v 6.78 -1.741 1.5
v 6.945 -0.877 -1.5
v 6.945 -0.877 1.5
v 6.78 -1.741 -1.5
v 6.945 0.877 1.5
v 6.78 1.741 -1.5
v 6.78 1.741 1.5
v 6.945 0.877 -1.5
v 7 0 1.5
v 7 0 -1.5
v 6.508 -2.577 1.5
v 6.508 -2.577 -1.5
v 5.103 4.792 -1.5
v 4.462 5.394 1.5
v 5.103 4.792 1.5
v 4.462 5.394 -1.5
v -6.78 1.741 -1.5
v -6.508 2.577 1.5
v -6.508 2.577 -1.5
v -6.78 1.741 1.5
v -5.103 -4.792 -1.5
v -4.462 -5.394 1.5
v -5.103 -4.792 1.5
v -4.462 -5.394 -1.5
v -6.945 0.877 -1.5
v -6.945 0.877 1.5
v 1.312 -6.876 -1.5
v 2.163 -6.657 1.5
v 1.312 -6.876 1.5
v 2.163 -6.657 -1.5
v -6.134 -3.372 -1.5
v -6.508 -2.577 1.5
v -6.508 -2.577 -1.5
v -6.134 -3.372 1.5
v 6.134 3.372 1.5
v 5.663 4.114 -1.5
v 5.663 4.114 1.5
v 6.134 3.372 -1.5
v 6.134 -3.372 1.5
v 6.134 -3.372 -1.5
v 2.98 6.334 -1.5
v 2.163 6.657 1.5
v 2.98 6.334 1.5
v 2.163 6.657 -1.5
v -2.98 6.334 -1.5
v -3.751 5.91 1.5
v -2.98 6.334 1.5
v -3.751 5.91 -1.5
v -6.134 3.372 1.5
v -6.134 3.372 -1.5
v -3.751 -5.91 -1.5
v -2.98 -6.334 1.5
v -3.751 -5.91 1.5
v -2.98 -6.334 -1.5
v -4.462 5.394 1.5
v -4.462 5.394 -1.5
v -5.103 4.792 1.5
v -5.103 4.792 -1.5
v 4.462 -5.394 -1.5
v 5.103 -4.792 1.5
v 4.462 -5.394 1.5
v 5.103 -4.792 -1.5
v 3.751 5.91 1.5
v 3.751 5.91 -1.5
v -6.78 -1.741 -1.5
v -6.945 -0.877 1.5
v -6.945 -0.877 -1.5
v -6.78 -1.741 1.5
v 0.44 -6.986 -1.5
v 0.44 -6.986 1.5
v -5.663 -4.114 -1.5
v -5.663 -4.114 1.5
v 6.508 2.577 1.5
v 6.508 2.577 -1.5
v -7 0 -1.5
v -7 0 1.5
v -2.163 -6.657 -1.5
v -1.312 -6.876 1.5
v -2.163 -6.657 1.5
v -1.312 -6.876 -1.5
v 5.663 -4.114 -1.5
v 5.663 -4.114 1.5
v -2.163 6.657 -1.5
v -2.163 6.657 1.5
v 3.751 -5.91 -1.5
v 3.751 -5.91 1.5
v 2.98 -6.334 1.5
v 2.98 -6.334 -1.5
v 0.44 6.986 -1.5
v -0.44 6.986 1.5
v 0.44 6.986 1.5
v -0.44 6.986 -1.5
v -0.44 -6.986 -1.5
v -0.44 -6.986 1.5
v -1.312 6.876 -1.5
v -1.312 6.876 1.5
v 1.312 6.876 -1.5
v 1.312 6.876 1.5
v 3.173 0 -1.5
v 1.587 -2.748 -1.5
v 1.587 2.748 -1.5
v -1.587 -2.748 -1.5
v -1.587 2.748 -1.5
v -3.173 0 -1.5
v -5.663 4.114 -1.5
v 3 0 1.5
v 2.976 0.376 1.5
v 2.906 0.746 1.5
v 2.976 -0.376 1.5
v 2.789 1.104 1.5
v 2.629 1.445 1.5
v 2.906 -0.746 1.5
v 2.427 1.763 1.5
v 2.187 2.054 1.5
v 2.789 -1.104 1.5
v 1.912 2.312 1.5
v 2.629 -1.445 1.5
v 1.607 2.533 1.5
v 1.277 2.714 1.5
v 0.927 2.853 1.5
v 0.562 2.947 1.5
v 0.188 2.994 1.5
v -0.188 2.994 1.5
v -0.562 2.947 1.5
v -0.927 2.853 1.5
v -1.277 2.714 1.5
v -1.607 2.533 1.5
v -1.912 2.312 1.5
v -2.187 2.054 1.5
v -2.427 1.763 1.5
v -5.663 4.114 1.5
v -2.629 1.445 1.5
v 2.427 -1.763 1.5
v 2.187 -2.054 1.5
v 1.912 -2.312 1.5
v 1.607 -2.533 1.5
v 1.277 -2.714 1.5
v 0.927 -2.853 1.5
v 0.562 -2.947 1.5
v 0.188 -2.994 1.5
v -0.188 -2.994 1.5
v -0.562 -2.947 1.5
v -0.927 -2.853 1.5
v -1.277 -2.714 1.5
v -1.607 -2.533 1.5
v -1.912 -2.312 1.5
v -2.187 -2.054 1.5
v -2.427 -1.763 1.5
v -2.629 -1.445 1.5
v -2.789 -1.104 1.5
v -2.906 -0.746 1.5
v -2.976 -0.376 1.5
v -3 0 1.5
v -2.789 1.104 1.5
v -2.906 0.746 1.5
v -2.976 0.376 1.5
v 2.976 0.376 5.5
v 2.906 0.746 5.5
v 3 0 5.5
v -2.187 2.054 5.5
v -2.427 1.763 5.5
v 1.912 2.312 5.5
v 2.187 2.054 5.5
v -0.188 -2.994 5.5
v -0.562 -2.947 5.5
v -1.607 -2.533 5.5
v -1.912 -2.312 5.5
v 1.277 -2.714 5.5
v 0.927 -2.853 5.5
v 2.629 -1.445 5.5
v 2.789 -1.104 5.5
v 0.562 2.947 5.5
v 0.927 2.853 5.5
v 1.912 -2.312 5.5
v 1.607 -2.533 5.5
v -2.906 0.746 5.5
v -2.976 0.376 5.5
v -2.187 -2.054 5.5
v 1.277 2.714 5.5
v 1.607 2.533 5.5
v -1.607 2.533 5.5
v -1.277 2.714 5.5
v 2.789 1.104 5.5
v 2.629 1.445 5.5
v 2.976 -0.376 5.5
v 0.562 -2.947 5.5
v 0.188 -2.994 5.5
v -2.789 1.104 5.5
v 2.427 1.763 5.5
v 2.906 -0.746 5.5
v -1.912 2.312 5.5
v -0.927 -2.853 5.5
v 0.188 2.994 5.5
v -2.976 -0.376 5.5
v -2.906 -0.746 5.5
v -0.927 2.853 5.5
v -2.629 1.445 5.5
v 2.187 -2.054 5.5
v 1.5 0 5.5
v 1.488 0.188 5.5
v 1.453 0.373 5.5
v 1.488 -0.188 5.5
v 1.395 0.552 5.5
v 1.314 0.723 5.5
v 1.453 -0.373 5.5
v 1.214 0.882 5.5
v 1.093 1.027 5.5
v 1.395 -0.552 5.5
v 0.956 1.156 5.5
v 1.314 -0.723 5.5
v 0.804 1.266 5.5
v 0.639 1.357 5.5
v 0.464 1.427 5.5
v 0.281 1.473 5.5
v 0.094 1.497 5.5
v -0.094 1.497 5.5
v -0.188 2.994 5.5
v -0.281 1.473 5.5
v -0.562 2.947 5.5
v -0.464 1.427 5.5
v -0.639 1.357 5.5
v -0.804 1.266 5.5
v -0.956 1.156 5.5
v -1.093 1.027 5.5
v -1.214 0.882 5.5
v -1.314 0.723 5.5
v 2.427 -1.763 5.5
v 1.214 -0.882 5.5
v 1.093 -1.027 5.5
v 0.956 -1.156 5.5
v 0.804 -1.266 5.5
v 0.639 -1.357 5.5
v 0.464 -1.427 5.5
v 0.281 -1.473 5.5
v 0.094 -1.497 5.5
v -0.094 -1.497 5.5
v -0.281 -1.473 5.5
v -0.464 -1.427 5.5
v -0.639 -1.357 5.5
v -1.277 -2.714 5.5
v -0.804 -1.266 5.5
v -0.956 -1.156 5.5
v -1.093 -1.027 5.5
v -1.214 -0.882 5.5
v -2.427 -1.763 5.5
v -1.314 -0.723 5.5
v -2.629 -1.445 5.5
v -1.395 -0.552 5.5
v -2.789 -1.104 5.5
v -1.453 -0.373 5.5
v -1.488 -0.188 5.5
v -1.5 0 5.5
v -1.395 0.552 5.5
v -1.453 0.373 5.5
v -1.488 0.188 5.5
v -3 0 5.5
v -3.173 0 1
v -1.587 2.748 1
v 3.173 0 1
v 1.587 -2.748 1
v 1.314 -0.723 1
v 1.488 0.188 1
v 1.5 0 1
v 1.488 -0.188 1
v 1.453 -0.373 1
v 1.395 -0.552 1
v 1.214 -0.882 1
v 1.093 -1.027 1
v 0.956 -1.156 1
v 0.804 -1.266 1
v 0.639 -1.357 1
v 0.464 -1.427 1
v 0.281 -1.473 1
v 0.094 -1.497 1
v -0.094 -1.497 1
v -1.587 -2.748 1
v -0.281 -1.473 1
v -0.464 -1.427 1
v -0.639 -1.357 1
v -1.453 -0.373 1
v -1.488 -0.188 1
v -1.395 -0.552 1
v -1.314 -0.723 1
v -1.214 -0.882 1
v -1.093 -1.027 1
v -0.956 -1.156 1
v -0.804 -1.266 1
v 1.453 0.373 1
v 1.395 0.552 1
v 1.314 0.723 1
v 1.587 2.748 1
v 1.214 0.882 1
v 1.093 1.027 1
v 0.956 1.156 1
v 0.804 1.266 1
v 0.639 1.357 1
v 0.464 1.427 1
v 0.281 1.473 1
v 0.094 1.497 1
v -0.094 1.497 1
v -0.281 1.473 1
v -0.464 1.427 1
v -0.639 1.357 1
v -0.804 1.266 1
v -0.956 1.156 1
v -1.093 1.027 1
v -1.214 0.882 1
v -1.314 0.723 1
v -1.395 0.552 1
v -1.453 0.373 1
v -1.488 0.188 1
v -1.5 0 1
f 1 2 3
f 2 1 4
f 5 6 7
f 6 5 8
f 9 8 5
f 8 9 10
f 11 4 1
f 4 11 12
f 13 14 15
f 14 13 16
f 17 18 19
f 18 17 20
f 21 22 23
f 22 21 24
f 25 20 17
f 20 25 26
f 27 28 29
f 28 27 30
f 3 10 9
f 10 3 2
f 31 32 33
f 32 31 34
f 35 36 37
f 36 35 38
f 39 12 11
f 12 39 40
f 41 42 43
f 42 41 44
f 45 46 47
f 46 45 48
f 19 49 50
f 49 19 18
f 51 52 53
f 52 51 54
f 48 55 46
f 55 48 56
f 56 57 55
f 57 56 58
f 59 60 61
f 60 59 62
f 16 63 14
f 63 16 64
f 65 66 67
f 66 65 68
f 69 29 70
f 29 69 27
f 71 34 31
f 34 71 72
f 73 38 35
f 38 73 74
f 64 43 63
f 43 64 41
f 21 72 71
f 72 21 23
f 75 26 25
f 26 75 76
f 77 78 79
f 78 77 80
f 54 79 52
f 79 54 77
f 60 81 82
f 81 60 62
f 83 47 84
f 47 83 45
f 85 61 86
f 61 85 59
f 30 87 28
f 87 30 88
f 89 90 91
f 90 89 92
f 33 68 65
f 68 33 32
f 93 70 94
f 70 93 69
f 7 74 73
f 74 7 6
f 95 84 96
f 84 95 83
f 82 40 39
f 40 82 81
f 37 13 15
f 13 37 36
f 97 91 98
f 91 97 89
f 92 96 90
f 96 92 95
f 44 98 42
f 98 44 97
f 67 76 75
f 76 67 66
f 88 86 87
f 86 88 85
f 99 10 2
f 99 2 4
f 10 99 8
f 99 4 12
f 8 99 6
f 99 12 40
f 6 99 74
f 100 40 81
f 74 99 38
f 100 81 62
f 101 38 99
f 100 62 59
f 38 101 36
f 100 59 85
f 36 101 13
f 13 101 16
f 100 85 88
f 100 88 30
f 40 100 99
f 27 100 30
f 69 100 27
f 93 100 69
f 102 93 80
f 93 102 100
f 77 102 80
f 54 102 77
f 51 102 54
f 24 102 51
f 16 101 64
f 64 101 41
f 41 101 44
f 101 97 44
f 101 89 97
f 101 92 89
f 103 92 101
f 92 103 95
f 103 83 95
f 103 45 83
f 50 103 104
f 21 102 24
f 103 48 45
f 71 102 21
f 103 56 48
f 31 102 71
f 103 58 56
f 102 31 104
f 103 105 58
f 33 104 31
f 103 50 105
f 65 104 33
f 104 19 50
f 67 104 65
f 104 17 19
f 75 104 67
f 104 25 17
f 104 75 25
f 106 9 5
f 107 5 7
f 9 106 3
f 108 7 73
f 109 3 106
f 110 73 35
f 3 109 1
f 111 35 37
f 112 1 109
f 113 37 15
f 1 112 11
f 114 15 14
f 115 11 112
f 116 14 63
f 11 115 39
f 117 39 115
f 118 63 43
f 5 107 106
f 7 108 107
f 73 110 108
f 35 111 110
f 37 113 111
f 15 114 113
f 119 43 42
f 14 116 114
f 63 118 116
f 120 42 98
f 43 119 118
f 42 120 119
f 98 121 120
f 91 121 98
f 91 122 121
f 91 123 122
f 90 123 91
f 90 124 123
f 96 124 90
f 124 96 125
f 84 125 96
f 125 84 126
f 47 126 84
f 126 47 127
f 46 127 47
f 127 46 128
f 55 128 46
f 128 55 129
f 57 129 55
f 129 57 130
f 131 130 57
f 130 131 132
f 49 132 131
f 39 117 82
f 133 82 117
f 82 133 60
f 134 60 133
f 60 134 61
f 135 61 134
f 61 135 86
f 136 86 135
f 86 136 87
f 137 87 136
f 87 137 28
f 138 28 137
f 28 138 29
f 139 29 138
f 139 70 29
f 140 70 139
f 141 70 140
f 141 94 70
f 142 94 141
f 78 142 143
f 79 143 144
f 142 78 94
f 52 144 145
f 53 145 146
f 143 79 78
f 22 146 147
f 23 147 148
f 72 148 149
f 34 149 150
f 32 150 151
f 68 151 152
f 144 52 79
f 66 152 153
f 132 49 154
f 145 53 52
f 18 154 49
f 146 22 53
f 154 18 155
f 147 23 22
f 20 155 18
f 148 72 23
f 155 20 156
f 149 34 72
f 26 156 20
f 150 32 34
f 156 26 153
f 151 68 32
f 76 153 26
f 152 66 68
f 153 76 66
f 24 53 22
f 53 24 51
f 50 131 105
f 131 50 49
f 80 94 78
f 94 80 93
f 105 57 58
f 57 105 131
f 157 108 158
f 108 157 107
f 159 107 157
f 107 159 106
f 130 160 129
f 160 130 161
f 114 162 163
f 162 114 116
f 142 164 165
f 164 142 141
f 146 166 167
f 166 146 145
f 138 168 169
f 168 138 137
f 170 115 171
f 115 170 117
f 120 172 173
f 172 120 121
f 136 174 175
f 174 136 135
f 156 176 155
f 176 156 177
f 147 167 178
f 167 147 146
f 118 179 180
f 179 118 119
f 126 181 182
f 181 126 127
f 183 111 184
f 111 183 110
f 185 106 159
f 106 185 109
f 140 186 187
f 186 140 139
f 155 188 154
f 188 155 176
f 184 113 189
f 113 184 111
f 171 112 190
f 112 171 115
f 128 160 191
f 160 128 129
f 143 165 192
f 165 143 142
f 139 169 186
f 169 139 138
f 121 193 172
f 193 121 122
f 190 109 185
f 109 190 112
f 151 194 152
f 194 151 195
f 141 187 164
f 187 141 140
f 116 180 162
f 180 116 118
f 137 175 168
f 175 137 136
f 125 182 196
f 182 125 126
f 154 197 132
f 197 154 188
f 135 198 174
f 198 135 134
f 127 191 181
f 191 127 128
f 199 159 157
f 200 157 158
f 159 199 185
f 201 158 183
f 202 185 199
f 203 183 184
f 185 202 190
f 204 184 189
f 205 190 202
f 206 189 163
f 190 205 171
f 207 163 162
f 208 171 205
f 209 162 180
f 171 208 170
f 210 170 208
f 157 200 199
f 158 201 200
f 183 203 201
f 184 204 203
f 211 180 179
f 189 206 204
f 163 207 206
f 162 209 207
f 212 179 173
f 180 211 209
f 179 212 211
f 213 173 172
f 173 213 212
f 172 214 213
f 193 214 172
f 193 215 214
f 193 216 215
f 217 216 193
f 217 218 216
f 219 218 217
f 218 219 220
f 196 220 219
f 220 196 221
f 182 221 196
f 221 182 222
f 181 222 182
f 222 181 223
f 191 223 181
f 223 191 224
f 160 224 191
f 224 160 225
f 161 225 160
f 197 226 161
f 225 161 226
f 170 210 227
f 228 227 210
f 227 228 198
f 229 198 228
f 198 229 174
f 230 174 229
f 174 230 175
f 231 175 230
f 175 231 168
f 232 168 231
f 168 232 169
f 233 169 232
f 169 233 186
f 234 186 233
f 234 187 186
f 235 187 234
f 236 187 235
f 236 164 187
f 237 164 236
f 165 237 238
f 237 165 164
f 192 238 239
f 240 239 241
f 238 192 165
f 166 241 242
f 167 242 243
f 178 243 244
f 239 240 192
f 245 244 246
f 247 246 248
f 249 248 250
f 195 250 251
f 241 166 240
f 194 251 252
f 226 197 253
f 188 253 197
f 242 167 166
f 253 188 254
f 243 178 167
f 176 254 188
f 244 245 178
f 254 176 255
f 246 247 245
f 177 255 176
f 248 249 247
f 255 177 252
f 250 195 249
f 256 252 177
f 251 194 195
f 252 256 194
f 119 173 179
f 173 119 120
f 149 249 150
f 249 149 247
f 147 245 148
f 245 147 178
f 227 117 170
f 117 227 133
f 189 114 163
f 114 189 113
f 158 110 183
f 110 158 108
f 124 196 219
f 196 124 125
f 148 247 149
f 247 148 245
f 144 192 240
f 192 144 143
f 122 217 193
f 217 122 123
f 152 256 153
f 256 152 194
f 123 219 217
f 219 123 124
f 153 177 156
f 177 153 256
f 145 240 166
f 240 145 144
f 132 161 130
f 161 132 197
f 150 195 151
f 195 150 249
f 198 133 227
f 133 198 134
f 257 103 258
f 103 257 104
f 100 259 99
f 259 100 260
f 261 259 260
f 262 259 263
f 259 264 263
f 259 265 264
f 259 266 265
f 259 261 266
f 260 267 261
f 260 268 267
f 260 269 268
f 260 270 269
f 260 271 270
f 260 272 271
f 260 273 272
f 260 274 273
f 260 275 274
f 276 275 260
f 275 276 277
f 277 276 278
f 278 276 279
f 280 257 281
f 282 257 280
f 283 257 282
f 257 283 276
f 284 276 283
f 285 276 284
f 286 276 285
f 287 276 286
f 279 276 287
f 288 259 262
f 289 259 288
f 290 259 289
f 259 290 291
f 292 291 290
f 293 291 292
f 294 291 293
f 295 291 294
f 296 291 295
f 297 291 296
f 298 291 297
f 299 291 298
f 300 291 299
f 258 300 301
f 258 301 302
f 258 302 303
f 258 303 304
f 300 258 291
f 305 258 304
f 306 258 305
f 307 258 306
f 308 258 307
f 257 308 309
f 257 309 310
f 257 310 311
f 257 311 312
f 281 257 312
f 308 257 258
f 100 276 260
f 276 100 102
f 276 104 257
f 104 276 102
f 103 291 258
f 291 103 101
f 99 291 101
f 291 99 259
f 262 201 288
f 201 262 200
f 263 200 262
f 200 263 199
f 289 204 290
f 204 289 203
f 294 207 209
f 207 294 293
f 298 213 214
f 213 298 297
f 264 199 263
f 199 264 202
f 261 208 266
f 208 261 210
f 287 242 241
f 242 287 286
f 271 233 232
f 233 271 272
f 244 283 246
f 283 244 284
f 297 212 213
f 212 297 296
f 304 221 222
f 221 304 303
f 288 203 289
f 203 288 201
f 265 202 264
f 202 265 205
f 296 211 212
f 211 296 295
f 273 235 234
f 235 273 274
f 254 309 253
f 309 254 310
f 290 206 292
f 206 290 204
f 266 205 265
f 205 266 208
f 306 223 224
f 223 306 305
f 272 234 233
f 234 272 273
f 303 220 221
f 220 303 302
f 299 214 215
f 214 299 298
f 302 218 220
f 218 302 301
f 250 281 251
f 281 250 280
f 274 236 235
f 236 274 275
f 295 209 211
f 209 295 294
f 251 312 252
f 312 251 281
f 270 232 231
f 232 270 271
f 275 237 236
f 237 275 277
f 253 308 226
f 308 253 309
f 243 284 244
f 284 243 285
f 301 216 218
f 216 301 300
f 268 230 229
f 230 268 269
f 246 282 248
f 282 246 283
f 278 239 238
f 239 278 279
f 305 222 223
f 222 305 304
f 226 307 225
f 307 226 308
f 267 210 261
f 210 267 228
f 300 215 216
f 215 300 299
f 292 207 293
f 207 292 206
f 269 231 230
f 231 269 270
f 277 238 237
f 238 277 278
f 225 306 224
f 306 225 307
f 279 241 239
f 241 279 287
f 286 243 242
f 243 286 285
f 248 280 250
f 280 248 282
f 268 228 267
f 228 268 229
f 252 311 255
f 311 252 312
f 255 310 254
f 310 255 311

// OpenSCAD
$fn = 50;


difference() {
	union() {
		translate(v = [0, 0, -1.5000000000]) {
			cylinder(h = 3, r = 7.0000000000);
		}
		translate(v = [0, 0, -1.5000000000]) {
			cylinder(h = 7, r = 3.0000000000);
		}
	}
	union() {
		translate(v = [0, 0, -1.5000000000]) {
			rotate(a = [0, 0, 0]) {
				difference() {
					union() {
						linear_extrude(height = 2.5000000000) {
							polygon(points = [[3.1735000000, 0.0000000000], [1.5867500000, 2.7483316189], [-1.5867500000, 2.7483316189], [-3.1735000000, 0.0000000000], [-1.5867500000, -2.7483316189], [1.5867500000, -2.7483316189]]);
						}
					}
					union();
				}
			}
		}
		translate(v = [0, 0, -100.0000000000]) {
			cylinder(h = 200, r = 1.5000000000);
		}
	}
}
